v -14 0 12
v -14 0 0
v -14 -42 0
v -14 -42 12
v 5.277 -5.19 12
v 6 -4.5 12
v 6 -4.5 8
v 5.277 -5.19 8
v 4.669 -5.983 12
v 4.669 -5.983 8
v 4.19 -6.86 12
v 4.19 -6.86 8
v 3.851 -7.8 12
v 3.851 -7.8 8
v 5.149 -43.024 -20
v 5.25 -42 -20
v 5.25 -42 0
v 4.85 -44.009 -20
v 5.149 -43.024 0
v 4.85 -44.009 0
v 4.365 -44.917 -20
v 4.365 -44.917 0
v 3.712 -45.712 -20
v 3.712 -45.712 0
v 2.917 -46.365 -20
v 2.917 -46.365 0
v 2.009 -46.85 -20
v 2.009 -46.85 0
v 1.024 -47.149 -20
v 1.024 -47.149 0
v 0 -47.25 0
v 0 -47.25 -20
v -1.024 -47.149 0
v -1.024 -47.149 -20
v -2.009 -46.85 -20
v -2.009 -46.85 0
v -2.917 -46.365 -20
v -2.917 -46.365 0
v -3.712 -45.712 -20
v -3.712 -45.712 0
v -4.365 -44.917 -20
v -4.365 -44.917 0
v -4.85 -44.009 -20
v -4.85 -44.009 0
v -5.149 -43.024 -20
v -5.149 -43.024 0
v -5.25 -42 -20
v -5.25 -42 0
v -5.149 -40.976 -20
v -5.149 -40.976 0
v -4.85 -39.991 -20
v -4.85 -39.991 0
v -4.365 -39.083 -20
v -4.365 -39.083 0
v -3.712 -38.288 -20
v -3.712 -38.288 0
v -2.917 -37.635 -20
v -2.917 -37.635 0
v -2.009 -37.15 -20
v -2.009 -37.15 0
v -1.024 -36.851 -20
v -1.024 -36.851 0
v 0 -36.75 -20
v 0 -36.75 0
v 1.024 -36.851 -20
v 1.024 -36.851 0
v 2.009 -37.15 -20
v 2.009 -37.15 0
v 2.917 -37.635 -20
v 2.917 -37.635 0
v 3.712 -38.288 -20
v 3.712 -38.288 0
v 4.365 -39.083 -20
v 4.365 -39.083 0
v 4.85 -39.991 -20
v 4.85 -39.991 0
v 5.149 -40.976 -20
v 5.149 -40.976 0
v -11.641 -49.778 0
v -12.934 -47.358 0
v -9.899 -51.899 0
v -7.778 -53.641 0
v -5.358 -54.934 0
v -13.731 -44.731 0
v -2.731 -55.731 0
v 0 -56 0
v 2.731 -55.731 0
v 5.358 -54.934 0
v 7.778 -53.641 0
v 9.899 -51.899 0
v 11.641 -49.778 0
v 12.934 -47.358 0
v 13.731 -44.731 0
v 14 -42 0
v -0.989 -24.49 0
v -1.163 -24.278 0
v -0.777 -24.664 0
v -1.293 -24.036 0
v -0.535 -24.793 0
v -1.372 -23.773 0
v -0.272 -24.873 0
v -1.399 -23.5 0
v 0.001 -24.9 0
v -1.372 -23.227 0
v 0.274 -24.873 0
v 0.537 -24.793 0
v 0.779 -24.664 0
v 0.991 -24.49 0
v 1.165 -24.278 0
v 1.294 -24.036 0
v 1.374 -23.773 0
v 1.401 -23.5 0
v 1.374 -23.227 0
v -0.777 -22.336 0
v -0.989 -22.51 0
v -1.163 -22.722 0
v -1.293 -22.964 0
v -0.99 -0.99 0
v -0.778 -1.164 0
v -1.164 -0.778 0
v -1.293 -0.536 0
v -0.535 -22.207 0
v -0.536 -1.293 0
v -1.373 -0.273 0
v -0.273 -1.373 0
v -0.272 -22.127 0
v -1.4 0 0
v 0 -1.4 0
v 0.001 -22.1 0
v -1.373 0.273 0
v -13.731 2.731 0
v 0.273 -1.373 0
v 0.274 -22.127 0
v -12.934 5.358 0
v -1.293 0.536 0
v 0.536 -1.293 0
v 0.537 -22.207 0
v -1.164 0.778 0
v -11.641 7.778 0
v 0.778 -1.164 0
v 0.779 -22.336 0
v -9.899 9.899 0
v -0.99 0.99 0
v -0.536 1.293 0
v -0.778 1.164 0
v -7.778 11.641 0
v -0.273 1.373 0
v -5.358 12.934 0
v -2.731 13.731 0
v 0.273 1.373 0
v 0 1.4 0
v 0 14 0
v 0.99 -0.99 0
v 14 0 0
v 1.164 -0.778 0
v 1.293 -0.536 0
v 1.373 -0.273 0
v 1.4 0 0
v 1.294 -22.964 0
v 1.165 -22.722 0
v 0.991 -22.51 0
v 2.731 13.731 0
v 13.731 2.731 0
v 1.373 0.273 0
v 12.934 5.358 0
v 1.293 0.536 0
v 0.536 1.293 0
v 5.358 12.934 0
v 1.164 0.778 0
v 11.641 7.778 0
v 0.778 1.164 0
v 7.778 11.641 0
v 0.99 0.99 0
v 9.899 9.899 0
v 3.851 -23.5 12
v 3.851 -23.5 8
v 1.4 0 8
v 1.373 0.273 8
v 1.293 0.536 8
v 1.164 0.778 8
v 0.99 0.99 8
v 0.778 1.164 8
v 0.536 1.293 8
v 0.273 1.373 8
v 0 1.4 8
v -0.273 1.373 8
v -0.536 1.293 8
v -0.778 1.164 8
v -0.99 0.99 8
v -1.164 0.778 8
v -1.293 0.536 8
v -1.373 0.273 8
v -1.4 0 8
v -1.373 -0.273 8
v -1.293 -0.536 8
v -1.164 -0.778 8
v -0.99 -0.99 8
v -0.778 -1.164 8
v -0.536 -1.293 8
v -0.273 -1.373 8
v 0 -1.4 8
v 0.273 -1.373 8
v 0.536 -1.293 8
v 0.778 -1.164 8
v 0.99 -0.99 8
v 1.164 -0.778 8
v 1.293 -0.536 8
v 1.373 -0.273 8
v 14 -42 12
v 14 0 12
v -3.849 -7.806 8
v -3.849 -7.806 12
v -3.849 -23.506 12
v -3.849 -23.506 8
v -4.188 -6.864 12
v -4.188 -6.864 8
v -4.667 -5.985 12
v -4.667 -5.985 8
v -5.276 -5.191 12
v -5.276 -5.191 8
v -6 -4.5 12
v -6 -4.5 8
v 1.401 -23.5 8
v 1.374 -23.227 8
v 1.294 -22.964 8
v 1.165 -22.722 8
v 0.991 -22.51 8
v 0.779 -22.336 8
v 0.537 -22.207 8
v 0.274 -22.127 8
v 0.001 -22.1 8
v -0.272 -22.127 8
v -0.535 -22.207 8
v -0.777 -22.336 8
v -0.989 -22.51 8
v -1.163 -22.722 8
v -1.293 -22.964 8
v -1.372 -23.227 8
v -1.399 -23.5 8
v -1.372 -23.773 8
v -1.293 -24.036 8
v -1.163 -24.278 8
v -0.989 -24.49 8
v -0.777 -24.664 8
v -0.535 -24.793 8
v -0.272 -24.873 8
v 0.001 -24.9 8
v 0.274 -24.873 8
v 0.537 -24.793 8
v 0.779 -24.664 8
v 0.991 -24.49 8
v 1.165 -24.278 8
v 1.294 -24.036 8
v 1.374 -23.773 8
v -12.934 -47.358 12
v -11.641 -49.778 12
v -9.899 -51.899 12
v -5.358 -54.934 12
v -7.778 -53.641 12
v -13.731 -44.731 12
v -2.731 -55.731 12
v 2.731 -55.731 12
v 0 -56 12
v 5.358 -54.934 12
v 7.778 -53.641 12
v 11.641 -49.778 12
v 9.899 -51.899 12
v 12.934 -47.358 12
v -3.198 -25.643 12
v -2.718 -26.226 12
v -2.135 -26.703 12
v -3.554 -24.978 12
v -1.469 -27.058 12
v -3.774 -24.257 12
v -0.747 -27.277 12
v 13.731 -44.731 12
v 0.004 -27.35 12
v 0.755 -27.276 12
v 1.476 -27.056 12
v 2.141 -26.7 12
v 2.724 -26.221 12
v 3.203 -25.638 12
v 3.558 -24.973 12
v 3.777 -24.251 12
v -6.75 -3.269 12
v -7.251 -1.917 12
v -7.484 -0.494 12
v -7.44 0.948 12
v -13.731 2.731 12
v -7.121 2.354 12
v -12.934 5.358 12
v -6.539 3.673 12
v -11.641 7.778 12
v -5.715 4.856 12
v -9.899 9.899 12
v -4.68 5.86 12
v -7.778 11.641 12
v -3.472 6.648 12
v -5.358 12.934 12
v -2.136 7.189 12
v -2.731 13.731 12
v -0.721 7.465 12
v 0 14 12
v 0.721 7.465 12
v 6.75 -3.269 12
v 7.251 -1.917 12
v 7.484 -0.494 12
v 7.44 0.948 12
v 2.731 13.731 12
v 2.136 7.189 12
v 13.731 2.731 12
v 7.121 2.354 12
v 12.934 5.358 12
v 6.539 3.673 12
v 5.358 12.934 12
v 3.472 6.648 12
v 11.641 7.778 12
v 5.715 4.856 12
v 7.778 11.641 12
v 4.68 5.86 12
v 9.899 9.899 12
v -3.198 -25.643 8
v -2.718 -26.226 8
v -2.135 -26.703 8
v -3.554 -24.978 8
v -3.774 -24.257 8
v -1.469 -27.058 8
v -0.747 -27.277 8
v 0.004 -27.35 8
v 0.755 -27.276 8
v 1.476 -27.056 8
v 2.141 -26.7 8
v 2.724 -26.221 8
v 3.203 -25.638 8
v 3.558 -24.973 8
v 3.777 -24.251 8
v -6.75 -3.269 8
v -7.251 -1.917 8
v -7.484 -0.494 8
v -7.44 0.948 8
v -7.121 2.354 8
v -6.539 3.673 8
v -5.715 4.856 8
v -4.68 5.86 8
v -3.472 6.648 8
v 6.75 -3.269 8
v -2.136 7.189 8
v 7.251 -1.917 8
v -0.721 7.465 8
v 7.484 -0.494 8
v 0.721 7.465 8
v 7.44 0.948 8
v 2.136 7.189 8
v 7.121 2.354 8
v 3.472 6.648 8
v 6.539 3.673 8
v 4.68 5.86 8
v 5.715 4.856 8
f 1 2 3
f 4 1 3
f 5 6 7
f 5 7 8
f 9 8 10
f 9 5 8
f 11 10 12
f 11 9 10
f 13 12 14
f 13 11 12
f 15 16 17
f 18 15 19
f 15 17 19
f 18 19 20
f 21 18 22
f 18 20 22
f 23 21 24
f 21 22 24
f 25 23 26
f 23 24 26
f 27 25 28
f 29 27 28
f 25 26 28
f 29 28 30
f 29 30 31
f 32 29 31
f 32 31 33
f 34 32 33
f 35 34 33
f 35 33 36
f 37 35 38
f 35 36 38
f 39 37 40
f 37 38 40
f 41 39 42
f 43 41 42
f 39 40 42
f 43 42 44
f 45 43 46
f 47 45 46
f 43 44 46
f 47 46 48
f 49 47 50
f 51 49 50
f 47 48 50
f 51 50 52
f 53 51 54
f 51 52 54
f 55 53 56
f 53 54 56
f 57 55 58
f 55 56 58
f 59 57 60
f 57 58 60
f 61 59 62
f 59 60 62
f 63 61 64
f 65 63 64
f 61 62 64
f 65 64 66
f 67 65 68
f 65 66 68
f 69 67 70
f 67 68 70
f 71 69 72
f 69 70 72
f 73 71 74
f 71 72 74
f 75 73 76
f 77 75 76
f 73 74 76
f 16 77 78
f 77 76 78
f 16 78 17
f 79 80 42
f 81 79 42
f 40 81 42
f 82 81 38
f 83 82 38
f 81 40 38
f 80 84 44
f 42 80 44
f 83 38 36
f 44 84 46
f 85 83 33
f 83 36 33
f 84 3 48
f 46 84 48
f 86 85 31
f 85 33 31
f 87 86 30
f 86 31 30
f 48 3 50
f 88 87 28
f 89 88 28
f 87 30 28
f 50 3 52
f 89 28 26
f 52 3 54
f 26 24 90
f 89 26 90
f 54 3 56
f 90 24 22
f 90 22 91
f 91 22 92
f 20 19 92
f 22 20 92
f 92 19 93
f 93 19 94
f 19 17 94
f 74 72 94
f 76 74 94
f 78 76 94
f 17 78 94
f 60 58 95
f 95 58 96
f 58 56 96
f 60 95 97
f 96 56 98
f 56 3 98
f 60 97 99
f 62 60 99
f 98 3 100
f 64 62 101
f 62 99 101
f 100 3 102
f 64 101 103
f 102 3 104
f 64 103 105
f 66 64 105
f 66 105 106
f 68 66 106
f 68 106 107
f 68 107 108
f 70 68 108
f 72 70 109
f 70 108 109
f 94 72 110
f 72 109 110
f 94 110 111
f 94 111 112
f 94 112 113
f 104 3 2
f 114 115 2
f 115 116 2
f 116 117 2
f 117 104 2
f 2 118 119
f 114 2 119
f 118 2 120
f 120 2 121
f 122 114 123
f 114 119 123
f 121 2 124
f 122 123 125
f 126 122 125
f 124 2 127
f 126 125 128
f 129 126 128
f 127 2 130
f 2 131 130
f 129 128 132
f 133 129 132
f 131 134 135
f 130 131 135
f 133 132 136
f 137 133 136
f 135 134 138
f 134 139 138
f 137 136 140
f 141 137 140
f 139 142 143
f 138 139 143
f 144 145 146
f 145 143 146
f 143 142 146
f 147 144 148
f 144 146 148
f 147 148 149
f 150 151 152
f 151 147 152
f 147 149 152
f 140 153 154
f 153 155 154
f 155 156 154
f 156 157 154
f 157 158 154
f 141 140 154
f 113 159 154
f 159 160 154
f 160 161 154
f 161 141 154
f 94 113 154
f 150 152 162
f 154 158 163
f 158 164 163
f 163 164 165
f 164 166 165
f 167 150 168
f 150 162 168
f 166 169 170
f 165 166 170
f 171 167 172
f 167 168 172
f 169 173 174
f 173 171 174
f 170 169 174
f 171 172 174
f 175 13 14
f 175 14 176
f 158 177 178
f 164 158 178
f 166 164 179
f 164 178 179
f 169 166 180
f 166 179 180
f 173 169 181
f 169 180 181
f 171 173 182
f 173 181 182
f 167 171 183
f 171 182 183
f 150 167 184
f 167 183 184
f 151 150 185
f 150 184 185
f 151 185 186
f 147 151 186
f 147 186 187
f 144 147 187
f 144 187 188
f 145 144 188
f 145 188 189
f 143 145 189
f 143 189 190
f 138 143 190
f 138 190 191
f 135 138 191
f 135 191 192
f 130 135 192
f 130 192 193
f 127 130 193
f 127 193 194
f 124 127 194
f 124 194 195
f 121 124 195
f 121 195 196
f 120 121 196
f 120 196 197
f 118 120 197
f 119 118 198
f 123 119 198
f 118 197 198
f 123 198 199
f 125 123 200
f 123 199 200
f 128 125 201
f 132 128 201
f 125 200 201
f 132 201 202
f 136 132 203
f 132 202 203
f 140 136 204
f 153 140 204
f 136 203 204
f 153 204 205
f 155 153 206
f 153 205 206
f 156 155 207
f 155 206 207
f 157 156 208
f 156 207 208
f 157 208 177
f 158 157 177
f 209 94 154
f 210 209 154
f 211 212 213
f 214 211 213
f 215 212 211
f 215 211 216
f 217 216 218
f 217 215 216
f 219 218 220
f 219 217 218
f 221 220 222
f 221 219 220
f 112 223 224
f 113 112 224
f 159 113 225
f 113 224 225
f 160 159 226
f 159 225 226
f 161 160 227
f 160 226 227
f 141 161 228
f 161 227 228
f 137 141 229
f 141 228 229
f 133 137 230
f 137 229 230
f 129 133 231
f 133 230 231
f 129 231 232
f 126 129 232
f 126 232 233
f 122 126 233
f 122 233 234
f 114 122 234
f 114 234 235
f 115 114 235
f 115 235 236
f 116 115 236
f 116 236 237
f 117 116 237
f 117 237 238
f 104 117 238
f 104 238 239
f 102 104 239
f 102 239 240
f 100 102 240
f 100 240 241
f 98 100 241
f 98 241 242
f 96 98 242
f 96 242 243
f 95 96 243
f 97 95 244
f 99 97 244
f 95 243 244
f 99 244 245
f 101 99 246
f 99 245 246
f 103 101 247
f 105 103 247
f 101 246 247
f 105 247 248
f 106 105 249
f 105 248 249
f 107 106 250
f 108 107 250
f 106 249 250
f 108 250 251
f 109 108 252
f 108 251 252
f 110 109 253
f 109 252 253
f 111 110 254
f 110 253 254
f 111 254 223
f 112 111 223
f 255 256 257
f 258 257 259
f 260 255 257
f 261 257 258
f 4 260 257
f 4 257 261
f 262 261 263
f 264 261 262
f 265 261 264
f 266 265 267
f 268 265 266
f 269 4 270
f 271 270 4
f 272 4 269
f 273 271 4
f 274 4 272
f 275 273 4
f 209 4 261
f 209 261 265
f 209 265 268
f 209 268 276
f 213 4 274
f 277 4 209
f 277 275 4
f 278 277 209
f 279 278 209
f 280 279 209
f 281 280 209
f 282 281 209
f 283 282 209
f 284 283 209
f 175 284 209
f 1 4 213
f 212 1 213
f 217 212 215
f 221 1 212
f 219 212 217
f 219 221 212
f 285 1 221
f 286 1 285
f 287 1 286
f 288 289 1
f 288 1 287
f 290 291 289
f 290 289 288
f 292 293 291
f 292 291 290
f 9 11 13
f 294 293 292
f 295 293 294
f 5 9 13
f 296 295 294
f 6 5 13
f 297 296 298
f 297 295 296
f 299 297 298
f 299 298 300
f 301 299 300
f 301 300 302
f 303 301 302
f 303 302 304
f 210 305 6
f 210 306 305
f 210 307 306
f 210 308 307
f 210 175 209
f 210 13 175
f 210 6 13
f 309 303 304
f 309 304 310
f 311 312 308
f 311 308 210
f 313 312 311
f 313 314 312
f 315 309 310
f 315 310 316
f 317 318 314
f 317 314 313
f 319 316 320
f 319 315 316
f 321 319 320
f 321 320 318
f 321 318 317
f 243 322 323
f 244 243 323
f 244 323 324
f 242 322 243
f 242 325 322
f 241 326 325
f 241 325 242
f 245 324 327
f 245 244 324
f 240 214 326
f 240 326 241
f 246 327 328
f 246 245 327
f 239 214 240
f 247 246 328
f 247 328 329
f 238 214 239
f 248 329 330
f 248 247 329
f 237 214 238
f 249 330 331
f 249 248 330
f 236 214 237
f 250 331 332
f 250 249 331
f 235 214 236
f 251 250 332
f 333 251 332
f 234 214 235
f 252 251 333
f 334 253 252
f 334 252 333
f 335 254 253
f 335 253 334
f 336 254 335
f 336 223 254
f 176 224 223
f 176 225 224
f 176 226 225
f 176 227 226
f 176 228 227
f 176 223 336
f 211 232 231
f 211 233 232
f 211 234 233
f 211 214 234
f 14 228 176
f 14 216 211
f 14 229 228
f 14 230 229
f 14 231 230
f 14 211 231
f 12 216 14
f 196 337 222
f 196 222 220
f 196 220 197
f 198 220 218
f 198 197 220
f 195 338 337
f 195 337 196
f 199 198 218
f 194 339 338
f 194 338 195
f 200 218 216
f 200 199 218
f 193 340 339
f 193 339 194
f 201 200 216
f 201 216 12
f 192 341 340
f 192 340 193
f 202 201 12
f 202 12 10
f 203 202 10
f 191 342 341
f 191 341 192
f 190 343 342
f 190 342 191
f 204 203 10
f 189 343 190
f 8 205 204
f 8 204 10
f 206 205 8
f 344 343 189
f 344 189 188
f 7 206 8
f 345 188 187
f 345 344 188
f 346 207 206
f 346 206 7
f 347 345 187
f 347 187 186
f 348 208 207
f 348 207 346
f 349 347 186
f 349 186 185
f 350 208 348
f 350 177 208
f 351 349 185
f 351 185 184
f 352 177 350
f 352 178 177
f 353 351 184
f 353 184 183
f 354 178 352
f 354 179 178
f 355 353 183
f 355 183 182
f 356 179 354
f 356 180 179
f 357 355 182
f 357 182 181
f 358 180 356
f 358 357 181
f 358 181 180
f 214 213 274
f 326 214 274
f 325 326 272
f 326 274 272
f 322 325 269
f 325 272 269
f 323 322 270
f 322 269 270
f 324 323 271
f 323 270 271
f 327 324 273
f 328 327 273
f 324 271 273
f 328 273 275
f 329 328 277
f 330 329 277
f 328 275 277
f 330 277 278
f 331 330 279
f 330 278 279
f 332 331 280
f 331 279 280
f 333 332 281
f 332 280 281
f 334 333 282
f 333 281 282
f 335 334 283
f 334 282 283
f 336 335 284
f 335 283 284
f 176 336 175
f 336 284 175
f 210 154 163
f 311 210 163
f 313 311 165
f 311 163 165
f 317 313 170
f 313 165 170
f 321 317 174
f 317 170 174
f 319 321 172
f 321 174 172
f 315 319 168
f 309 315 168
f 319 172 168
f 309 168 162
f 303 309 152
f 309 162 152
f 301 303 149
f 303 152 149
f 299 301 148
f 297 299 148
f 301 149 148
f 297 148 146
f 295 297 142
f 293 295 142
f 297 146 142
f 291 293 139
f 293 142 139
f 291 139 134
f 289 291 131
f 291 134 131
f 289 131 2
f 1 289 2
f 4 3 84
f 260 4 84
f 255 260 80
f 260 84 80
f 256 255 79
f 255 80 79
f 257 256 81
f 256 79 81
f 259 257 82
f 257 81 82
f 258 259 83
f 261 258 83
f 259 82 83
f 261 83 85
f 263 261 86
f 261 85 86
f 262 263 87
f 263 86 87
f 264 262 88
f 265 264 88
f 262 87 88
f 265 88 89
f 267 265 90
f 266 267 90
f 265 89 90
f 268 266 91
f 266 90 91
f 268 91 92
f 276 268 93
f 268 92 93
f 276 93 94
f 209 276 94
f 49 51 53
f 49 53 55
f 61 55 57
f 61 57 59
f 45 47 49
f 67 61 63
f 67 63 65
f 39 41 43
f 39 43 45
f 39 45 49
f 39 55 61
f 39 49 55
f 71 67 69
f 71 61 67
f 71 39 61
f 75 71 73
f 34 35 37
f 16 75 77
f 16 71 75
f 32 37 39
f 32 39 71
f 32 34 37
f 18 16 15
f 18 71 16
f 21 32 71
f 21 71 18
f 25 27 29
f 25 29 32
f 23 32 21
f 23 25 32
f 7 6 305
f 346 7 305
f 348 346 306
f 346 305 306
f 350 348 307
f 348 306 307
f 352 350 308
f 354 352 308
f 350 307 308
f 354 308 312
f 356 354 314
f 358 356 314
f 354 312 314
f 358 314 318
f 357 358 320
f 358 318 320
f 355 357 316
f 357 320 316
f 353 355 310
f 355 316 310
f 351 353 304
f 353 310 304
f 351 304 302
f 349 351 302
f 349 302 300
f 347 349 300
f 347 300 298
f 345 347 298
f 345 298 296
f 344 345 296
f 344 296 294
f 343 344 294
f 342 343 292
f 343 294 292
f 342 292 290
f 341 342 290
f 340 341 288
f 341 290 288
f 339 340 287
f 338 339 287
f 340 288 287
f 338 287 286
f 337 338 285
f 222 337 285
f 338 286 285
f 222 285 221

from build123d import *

# Parameters (mm, degrees)
PAD_DEPTH       = 12
POCKET_DEPTH    = 4
SKETCH002_R     = 5.25
PAD001_DEPTH    = 20
SKETCH003_R     = 1.4
POCKET001_DEPTH = 28.001


with BuildPart() as part:
    # Sketch001 → Pad (new body)
    with BuildSketch(Plane.XY):
        with BuildLine():
            ThreePointArc((14, 0), (0, 14), (-14, 0))
            Line((-14, 0), (-14, -42))
            ThreePointArc((-14, -42), (0, -56), (14, -42))
            Line((14, -42), (14, 0))
        make_face()
    extrude(amount=PAD_DEPTH)

    # Sketch (on Face6 of Pad) → Pocket (cut)
    with BuildSketch(Plane.XY.offset(12)):
        with BuildLine():
            ThreePointArc((6, -4.5), (0, 7.5), (-6, -4.5))
            ThreePointArc((-3.84916, -7.806116), (-4.666992, -5.985481), (-6, -4.5))
            Line((-3.84916, -7.806116), (-3.84916, -23.506116))
            ThreePointArc((-3.84916, -23.506116), (0.003896, -27.350001), (3.85084, -23.5))
            Line((3.85084, -7.8), (3.85084, -23.5))
            ThreePointArc((6, -4.5), (4.668722, -5.982823), (3.85084, -7.8))
        make_face()
    extrude(amount=-POCKET_DEPTH, mode=Mode.SUBTRACT)

    # Sketch002 (on Face4 of Pocket) → Pad001 (join)
    with BuildSketch(Plane(origin=(0, 0, 0), x_dir=(1, 0, 0), z_dir=(0, 0, -1))):
        with Locations((0, 42)):
            Circle(SKETCH002_R)
    extrude(amount=PAD001_DEPTH)

    # Sketch003 (on Face15 of Pad001) → Pocket001 (cut, through all)
    with BuildSketch(Plane.XY.offset(8)):
        Circle(SKETCH003_R)
        with Locations((0.000838, -23.5)):
            Circle(SKETCH003_R)
    extrude(amount=-POCKET001_DEPTH, mode=Mode.SUBTRACT)


solid = part.part
